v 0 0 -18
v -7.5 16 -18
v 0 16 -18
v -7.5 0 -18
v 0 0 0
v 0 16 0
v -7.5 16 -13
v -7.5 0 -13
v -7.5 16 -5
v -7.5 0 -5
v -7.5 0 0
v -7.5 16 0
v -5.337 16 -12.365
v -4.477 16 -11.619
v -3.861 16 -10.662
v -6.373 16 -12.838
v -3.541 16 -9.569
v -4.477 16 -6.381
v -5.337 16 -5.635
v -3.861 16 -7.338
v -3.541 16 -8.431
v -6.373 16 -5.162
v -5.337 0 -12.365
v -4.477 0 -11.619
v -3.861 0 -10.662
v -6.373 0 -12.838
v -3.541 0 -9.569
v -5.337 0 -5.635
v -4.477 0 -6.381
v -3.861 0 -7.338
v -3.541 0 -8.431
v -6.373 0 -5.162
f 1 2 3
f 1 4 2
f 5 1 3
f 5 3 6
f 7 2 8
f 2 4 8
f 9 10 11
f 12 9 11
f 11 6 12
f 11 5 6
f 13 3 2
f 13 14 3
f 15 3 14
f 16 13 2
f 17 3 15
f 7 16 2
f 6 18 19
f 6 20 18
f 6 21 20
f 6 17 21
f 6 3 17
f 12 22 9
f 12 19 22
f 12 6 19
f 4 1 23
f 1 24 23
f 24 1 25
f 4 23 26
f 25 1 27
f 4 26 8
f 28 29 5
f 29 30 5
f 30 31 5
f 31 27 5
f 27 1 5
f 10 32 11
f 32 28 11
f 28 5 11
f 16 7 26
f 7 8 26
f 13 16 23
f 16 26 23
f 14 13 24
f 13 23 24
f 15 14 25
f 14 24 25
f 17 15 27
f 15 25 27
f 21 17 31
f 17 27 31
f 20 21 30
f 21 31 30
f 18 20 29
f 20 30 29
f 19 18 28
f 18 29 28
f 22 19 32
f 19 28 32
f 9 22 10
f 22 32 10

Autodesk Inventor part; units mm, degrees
ref_plane "YZ Plane" through (0, 0, 0) normal (1, 0, 0) x (0, 1, 0)
ref_plane "XZ Plane" through (0, 0, 0) normal (0, 1, 0) x (-1, 0, 0)
ref_plane "XY Plane" through (0, 0, 0) normal (0, 0, 1) x (1, 0, 0)
sketch "Sketch1" plane through (0, 0, 0) normal (0, 1, 0) x (-1, 0, 0)
  line L0 (0, 0) -> (7.5, 0)
  line L1 (7.5, -18) -> (0, -18)
  line L2 (0, -18) -> (0, 0)
  arc A0 (7.5, -5) -> (7.5, -13) centre (7.5, -9) ccw
  line L3 (7.5, -18) -> (7.5, -13)
  line L4 (7.5, -5) -> (7.5, 0)
  dimension "d0" = 7.5
  dimension "d1" = 18
  dimension "d5" = 4
  dimension "d6" = 0
  dimension "d7" = 5
  dimension "d8" = 0
extrude "Extrusion2" add sketch "Sketch1" along normal blind 16
properties part number "Lower Base Bearing Holder" material "Brass, Soft Yellow"
